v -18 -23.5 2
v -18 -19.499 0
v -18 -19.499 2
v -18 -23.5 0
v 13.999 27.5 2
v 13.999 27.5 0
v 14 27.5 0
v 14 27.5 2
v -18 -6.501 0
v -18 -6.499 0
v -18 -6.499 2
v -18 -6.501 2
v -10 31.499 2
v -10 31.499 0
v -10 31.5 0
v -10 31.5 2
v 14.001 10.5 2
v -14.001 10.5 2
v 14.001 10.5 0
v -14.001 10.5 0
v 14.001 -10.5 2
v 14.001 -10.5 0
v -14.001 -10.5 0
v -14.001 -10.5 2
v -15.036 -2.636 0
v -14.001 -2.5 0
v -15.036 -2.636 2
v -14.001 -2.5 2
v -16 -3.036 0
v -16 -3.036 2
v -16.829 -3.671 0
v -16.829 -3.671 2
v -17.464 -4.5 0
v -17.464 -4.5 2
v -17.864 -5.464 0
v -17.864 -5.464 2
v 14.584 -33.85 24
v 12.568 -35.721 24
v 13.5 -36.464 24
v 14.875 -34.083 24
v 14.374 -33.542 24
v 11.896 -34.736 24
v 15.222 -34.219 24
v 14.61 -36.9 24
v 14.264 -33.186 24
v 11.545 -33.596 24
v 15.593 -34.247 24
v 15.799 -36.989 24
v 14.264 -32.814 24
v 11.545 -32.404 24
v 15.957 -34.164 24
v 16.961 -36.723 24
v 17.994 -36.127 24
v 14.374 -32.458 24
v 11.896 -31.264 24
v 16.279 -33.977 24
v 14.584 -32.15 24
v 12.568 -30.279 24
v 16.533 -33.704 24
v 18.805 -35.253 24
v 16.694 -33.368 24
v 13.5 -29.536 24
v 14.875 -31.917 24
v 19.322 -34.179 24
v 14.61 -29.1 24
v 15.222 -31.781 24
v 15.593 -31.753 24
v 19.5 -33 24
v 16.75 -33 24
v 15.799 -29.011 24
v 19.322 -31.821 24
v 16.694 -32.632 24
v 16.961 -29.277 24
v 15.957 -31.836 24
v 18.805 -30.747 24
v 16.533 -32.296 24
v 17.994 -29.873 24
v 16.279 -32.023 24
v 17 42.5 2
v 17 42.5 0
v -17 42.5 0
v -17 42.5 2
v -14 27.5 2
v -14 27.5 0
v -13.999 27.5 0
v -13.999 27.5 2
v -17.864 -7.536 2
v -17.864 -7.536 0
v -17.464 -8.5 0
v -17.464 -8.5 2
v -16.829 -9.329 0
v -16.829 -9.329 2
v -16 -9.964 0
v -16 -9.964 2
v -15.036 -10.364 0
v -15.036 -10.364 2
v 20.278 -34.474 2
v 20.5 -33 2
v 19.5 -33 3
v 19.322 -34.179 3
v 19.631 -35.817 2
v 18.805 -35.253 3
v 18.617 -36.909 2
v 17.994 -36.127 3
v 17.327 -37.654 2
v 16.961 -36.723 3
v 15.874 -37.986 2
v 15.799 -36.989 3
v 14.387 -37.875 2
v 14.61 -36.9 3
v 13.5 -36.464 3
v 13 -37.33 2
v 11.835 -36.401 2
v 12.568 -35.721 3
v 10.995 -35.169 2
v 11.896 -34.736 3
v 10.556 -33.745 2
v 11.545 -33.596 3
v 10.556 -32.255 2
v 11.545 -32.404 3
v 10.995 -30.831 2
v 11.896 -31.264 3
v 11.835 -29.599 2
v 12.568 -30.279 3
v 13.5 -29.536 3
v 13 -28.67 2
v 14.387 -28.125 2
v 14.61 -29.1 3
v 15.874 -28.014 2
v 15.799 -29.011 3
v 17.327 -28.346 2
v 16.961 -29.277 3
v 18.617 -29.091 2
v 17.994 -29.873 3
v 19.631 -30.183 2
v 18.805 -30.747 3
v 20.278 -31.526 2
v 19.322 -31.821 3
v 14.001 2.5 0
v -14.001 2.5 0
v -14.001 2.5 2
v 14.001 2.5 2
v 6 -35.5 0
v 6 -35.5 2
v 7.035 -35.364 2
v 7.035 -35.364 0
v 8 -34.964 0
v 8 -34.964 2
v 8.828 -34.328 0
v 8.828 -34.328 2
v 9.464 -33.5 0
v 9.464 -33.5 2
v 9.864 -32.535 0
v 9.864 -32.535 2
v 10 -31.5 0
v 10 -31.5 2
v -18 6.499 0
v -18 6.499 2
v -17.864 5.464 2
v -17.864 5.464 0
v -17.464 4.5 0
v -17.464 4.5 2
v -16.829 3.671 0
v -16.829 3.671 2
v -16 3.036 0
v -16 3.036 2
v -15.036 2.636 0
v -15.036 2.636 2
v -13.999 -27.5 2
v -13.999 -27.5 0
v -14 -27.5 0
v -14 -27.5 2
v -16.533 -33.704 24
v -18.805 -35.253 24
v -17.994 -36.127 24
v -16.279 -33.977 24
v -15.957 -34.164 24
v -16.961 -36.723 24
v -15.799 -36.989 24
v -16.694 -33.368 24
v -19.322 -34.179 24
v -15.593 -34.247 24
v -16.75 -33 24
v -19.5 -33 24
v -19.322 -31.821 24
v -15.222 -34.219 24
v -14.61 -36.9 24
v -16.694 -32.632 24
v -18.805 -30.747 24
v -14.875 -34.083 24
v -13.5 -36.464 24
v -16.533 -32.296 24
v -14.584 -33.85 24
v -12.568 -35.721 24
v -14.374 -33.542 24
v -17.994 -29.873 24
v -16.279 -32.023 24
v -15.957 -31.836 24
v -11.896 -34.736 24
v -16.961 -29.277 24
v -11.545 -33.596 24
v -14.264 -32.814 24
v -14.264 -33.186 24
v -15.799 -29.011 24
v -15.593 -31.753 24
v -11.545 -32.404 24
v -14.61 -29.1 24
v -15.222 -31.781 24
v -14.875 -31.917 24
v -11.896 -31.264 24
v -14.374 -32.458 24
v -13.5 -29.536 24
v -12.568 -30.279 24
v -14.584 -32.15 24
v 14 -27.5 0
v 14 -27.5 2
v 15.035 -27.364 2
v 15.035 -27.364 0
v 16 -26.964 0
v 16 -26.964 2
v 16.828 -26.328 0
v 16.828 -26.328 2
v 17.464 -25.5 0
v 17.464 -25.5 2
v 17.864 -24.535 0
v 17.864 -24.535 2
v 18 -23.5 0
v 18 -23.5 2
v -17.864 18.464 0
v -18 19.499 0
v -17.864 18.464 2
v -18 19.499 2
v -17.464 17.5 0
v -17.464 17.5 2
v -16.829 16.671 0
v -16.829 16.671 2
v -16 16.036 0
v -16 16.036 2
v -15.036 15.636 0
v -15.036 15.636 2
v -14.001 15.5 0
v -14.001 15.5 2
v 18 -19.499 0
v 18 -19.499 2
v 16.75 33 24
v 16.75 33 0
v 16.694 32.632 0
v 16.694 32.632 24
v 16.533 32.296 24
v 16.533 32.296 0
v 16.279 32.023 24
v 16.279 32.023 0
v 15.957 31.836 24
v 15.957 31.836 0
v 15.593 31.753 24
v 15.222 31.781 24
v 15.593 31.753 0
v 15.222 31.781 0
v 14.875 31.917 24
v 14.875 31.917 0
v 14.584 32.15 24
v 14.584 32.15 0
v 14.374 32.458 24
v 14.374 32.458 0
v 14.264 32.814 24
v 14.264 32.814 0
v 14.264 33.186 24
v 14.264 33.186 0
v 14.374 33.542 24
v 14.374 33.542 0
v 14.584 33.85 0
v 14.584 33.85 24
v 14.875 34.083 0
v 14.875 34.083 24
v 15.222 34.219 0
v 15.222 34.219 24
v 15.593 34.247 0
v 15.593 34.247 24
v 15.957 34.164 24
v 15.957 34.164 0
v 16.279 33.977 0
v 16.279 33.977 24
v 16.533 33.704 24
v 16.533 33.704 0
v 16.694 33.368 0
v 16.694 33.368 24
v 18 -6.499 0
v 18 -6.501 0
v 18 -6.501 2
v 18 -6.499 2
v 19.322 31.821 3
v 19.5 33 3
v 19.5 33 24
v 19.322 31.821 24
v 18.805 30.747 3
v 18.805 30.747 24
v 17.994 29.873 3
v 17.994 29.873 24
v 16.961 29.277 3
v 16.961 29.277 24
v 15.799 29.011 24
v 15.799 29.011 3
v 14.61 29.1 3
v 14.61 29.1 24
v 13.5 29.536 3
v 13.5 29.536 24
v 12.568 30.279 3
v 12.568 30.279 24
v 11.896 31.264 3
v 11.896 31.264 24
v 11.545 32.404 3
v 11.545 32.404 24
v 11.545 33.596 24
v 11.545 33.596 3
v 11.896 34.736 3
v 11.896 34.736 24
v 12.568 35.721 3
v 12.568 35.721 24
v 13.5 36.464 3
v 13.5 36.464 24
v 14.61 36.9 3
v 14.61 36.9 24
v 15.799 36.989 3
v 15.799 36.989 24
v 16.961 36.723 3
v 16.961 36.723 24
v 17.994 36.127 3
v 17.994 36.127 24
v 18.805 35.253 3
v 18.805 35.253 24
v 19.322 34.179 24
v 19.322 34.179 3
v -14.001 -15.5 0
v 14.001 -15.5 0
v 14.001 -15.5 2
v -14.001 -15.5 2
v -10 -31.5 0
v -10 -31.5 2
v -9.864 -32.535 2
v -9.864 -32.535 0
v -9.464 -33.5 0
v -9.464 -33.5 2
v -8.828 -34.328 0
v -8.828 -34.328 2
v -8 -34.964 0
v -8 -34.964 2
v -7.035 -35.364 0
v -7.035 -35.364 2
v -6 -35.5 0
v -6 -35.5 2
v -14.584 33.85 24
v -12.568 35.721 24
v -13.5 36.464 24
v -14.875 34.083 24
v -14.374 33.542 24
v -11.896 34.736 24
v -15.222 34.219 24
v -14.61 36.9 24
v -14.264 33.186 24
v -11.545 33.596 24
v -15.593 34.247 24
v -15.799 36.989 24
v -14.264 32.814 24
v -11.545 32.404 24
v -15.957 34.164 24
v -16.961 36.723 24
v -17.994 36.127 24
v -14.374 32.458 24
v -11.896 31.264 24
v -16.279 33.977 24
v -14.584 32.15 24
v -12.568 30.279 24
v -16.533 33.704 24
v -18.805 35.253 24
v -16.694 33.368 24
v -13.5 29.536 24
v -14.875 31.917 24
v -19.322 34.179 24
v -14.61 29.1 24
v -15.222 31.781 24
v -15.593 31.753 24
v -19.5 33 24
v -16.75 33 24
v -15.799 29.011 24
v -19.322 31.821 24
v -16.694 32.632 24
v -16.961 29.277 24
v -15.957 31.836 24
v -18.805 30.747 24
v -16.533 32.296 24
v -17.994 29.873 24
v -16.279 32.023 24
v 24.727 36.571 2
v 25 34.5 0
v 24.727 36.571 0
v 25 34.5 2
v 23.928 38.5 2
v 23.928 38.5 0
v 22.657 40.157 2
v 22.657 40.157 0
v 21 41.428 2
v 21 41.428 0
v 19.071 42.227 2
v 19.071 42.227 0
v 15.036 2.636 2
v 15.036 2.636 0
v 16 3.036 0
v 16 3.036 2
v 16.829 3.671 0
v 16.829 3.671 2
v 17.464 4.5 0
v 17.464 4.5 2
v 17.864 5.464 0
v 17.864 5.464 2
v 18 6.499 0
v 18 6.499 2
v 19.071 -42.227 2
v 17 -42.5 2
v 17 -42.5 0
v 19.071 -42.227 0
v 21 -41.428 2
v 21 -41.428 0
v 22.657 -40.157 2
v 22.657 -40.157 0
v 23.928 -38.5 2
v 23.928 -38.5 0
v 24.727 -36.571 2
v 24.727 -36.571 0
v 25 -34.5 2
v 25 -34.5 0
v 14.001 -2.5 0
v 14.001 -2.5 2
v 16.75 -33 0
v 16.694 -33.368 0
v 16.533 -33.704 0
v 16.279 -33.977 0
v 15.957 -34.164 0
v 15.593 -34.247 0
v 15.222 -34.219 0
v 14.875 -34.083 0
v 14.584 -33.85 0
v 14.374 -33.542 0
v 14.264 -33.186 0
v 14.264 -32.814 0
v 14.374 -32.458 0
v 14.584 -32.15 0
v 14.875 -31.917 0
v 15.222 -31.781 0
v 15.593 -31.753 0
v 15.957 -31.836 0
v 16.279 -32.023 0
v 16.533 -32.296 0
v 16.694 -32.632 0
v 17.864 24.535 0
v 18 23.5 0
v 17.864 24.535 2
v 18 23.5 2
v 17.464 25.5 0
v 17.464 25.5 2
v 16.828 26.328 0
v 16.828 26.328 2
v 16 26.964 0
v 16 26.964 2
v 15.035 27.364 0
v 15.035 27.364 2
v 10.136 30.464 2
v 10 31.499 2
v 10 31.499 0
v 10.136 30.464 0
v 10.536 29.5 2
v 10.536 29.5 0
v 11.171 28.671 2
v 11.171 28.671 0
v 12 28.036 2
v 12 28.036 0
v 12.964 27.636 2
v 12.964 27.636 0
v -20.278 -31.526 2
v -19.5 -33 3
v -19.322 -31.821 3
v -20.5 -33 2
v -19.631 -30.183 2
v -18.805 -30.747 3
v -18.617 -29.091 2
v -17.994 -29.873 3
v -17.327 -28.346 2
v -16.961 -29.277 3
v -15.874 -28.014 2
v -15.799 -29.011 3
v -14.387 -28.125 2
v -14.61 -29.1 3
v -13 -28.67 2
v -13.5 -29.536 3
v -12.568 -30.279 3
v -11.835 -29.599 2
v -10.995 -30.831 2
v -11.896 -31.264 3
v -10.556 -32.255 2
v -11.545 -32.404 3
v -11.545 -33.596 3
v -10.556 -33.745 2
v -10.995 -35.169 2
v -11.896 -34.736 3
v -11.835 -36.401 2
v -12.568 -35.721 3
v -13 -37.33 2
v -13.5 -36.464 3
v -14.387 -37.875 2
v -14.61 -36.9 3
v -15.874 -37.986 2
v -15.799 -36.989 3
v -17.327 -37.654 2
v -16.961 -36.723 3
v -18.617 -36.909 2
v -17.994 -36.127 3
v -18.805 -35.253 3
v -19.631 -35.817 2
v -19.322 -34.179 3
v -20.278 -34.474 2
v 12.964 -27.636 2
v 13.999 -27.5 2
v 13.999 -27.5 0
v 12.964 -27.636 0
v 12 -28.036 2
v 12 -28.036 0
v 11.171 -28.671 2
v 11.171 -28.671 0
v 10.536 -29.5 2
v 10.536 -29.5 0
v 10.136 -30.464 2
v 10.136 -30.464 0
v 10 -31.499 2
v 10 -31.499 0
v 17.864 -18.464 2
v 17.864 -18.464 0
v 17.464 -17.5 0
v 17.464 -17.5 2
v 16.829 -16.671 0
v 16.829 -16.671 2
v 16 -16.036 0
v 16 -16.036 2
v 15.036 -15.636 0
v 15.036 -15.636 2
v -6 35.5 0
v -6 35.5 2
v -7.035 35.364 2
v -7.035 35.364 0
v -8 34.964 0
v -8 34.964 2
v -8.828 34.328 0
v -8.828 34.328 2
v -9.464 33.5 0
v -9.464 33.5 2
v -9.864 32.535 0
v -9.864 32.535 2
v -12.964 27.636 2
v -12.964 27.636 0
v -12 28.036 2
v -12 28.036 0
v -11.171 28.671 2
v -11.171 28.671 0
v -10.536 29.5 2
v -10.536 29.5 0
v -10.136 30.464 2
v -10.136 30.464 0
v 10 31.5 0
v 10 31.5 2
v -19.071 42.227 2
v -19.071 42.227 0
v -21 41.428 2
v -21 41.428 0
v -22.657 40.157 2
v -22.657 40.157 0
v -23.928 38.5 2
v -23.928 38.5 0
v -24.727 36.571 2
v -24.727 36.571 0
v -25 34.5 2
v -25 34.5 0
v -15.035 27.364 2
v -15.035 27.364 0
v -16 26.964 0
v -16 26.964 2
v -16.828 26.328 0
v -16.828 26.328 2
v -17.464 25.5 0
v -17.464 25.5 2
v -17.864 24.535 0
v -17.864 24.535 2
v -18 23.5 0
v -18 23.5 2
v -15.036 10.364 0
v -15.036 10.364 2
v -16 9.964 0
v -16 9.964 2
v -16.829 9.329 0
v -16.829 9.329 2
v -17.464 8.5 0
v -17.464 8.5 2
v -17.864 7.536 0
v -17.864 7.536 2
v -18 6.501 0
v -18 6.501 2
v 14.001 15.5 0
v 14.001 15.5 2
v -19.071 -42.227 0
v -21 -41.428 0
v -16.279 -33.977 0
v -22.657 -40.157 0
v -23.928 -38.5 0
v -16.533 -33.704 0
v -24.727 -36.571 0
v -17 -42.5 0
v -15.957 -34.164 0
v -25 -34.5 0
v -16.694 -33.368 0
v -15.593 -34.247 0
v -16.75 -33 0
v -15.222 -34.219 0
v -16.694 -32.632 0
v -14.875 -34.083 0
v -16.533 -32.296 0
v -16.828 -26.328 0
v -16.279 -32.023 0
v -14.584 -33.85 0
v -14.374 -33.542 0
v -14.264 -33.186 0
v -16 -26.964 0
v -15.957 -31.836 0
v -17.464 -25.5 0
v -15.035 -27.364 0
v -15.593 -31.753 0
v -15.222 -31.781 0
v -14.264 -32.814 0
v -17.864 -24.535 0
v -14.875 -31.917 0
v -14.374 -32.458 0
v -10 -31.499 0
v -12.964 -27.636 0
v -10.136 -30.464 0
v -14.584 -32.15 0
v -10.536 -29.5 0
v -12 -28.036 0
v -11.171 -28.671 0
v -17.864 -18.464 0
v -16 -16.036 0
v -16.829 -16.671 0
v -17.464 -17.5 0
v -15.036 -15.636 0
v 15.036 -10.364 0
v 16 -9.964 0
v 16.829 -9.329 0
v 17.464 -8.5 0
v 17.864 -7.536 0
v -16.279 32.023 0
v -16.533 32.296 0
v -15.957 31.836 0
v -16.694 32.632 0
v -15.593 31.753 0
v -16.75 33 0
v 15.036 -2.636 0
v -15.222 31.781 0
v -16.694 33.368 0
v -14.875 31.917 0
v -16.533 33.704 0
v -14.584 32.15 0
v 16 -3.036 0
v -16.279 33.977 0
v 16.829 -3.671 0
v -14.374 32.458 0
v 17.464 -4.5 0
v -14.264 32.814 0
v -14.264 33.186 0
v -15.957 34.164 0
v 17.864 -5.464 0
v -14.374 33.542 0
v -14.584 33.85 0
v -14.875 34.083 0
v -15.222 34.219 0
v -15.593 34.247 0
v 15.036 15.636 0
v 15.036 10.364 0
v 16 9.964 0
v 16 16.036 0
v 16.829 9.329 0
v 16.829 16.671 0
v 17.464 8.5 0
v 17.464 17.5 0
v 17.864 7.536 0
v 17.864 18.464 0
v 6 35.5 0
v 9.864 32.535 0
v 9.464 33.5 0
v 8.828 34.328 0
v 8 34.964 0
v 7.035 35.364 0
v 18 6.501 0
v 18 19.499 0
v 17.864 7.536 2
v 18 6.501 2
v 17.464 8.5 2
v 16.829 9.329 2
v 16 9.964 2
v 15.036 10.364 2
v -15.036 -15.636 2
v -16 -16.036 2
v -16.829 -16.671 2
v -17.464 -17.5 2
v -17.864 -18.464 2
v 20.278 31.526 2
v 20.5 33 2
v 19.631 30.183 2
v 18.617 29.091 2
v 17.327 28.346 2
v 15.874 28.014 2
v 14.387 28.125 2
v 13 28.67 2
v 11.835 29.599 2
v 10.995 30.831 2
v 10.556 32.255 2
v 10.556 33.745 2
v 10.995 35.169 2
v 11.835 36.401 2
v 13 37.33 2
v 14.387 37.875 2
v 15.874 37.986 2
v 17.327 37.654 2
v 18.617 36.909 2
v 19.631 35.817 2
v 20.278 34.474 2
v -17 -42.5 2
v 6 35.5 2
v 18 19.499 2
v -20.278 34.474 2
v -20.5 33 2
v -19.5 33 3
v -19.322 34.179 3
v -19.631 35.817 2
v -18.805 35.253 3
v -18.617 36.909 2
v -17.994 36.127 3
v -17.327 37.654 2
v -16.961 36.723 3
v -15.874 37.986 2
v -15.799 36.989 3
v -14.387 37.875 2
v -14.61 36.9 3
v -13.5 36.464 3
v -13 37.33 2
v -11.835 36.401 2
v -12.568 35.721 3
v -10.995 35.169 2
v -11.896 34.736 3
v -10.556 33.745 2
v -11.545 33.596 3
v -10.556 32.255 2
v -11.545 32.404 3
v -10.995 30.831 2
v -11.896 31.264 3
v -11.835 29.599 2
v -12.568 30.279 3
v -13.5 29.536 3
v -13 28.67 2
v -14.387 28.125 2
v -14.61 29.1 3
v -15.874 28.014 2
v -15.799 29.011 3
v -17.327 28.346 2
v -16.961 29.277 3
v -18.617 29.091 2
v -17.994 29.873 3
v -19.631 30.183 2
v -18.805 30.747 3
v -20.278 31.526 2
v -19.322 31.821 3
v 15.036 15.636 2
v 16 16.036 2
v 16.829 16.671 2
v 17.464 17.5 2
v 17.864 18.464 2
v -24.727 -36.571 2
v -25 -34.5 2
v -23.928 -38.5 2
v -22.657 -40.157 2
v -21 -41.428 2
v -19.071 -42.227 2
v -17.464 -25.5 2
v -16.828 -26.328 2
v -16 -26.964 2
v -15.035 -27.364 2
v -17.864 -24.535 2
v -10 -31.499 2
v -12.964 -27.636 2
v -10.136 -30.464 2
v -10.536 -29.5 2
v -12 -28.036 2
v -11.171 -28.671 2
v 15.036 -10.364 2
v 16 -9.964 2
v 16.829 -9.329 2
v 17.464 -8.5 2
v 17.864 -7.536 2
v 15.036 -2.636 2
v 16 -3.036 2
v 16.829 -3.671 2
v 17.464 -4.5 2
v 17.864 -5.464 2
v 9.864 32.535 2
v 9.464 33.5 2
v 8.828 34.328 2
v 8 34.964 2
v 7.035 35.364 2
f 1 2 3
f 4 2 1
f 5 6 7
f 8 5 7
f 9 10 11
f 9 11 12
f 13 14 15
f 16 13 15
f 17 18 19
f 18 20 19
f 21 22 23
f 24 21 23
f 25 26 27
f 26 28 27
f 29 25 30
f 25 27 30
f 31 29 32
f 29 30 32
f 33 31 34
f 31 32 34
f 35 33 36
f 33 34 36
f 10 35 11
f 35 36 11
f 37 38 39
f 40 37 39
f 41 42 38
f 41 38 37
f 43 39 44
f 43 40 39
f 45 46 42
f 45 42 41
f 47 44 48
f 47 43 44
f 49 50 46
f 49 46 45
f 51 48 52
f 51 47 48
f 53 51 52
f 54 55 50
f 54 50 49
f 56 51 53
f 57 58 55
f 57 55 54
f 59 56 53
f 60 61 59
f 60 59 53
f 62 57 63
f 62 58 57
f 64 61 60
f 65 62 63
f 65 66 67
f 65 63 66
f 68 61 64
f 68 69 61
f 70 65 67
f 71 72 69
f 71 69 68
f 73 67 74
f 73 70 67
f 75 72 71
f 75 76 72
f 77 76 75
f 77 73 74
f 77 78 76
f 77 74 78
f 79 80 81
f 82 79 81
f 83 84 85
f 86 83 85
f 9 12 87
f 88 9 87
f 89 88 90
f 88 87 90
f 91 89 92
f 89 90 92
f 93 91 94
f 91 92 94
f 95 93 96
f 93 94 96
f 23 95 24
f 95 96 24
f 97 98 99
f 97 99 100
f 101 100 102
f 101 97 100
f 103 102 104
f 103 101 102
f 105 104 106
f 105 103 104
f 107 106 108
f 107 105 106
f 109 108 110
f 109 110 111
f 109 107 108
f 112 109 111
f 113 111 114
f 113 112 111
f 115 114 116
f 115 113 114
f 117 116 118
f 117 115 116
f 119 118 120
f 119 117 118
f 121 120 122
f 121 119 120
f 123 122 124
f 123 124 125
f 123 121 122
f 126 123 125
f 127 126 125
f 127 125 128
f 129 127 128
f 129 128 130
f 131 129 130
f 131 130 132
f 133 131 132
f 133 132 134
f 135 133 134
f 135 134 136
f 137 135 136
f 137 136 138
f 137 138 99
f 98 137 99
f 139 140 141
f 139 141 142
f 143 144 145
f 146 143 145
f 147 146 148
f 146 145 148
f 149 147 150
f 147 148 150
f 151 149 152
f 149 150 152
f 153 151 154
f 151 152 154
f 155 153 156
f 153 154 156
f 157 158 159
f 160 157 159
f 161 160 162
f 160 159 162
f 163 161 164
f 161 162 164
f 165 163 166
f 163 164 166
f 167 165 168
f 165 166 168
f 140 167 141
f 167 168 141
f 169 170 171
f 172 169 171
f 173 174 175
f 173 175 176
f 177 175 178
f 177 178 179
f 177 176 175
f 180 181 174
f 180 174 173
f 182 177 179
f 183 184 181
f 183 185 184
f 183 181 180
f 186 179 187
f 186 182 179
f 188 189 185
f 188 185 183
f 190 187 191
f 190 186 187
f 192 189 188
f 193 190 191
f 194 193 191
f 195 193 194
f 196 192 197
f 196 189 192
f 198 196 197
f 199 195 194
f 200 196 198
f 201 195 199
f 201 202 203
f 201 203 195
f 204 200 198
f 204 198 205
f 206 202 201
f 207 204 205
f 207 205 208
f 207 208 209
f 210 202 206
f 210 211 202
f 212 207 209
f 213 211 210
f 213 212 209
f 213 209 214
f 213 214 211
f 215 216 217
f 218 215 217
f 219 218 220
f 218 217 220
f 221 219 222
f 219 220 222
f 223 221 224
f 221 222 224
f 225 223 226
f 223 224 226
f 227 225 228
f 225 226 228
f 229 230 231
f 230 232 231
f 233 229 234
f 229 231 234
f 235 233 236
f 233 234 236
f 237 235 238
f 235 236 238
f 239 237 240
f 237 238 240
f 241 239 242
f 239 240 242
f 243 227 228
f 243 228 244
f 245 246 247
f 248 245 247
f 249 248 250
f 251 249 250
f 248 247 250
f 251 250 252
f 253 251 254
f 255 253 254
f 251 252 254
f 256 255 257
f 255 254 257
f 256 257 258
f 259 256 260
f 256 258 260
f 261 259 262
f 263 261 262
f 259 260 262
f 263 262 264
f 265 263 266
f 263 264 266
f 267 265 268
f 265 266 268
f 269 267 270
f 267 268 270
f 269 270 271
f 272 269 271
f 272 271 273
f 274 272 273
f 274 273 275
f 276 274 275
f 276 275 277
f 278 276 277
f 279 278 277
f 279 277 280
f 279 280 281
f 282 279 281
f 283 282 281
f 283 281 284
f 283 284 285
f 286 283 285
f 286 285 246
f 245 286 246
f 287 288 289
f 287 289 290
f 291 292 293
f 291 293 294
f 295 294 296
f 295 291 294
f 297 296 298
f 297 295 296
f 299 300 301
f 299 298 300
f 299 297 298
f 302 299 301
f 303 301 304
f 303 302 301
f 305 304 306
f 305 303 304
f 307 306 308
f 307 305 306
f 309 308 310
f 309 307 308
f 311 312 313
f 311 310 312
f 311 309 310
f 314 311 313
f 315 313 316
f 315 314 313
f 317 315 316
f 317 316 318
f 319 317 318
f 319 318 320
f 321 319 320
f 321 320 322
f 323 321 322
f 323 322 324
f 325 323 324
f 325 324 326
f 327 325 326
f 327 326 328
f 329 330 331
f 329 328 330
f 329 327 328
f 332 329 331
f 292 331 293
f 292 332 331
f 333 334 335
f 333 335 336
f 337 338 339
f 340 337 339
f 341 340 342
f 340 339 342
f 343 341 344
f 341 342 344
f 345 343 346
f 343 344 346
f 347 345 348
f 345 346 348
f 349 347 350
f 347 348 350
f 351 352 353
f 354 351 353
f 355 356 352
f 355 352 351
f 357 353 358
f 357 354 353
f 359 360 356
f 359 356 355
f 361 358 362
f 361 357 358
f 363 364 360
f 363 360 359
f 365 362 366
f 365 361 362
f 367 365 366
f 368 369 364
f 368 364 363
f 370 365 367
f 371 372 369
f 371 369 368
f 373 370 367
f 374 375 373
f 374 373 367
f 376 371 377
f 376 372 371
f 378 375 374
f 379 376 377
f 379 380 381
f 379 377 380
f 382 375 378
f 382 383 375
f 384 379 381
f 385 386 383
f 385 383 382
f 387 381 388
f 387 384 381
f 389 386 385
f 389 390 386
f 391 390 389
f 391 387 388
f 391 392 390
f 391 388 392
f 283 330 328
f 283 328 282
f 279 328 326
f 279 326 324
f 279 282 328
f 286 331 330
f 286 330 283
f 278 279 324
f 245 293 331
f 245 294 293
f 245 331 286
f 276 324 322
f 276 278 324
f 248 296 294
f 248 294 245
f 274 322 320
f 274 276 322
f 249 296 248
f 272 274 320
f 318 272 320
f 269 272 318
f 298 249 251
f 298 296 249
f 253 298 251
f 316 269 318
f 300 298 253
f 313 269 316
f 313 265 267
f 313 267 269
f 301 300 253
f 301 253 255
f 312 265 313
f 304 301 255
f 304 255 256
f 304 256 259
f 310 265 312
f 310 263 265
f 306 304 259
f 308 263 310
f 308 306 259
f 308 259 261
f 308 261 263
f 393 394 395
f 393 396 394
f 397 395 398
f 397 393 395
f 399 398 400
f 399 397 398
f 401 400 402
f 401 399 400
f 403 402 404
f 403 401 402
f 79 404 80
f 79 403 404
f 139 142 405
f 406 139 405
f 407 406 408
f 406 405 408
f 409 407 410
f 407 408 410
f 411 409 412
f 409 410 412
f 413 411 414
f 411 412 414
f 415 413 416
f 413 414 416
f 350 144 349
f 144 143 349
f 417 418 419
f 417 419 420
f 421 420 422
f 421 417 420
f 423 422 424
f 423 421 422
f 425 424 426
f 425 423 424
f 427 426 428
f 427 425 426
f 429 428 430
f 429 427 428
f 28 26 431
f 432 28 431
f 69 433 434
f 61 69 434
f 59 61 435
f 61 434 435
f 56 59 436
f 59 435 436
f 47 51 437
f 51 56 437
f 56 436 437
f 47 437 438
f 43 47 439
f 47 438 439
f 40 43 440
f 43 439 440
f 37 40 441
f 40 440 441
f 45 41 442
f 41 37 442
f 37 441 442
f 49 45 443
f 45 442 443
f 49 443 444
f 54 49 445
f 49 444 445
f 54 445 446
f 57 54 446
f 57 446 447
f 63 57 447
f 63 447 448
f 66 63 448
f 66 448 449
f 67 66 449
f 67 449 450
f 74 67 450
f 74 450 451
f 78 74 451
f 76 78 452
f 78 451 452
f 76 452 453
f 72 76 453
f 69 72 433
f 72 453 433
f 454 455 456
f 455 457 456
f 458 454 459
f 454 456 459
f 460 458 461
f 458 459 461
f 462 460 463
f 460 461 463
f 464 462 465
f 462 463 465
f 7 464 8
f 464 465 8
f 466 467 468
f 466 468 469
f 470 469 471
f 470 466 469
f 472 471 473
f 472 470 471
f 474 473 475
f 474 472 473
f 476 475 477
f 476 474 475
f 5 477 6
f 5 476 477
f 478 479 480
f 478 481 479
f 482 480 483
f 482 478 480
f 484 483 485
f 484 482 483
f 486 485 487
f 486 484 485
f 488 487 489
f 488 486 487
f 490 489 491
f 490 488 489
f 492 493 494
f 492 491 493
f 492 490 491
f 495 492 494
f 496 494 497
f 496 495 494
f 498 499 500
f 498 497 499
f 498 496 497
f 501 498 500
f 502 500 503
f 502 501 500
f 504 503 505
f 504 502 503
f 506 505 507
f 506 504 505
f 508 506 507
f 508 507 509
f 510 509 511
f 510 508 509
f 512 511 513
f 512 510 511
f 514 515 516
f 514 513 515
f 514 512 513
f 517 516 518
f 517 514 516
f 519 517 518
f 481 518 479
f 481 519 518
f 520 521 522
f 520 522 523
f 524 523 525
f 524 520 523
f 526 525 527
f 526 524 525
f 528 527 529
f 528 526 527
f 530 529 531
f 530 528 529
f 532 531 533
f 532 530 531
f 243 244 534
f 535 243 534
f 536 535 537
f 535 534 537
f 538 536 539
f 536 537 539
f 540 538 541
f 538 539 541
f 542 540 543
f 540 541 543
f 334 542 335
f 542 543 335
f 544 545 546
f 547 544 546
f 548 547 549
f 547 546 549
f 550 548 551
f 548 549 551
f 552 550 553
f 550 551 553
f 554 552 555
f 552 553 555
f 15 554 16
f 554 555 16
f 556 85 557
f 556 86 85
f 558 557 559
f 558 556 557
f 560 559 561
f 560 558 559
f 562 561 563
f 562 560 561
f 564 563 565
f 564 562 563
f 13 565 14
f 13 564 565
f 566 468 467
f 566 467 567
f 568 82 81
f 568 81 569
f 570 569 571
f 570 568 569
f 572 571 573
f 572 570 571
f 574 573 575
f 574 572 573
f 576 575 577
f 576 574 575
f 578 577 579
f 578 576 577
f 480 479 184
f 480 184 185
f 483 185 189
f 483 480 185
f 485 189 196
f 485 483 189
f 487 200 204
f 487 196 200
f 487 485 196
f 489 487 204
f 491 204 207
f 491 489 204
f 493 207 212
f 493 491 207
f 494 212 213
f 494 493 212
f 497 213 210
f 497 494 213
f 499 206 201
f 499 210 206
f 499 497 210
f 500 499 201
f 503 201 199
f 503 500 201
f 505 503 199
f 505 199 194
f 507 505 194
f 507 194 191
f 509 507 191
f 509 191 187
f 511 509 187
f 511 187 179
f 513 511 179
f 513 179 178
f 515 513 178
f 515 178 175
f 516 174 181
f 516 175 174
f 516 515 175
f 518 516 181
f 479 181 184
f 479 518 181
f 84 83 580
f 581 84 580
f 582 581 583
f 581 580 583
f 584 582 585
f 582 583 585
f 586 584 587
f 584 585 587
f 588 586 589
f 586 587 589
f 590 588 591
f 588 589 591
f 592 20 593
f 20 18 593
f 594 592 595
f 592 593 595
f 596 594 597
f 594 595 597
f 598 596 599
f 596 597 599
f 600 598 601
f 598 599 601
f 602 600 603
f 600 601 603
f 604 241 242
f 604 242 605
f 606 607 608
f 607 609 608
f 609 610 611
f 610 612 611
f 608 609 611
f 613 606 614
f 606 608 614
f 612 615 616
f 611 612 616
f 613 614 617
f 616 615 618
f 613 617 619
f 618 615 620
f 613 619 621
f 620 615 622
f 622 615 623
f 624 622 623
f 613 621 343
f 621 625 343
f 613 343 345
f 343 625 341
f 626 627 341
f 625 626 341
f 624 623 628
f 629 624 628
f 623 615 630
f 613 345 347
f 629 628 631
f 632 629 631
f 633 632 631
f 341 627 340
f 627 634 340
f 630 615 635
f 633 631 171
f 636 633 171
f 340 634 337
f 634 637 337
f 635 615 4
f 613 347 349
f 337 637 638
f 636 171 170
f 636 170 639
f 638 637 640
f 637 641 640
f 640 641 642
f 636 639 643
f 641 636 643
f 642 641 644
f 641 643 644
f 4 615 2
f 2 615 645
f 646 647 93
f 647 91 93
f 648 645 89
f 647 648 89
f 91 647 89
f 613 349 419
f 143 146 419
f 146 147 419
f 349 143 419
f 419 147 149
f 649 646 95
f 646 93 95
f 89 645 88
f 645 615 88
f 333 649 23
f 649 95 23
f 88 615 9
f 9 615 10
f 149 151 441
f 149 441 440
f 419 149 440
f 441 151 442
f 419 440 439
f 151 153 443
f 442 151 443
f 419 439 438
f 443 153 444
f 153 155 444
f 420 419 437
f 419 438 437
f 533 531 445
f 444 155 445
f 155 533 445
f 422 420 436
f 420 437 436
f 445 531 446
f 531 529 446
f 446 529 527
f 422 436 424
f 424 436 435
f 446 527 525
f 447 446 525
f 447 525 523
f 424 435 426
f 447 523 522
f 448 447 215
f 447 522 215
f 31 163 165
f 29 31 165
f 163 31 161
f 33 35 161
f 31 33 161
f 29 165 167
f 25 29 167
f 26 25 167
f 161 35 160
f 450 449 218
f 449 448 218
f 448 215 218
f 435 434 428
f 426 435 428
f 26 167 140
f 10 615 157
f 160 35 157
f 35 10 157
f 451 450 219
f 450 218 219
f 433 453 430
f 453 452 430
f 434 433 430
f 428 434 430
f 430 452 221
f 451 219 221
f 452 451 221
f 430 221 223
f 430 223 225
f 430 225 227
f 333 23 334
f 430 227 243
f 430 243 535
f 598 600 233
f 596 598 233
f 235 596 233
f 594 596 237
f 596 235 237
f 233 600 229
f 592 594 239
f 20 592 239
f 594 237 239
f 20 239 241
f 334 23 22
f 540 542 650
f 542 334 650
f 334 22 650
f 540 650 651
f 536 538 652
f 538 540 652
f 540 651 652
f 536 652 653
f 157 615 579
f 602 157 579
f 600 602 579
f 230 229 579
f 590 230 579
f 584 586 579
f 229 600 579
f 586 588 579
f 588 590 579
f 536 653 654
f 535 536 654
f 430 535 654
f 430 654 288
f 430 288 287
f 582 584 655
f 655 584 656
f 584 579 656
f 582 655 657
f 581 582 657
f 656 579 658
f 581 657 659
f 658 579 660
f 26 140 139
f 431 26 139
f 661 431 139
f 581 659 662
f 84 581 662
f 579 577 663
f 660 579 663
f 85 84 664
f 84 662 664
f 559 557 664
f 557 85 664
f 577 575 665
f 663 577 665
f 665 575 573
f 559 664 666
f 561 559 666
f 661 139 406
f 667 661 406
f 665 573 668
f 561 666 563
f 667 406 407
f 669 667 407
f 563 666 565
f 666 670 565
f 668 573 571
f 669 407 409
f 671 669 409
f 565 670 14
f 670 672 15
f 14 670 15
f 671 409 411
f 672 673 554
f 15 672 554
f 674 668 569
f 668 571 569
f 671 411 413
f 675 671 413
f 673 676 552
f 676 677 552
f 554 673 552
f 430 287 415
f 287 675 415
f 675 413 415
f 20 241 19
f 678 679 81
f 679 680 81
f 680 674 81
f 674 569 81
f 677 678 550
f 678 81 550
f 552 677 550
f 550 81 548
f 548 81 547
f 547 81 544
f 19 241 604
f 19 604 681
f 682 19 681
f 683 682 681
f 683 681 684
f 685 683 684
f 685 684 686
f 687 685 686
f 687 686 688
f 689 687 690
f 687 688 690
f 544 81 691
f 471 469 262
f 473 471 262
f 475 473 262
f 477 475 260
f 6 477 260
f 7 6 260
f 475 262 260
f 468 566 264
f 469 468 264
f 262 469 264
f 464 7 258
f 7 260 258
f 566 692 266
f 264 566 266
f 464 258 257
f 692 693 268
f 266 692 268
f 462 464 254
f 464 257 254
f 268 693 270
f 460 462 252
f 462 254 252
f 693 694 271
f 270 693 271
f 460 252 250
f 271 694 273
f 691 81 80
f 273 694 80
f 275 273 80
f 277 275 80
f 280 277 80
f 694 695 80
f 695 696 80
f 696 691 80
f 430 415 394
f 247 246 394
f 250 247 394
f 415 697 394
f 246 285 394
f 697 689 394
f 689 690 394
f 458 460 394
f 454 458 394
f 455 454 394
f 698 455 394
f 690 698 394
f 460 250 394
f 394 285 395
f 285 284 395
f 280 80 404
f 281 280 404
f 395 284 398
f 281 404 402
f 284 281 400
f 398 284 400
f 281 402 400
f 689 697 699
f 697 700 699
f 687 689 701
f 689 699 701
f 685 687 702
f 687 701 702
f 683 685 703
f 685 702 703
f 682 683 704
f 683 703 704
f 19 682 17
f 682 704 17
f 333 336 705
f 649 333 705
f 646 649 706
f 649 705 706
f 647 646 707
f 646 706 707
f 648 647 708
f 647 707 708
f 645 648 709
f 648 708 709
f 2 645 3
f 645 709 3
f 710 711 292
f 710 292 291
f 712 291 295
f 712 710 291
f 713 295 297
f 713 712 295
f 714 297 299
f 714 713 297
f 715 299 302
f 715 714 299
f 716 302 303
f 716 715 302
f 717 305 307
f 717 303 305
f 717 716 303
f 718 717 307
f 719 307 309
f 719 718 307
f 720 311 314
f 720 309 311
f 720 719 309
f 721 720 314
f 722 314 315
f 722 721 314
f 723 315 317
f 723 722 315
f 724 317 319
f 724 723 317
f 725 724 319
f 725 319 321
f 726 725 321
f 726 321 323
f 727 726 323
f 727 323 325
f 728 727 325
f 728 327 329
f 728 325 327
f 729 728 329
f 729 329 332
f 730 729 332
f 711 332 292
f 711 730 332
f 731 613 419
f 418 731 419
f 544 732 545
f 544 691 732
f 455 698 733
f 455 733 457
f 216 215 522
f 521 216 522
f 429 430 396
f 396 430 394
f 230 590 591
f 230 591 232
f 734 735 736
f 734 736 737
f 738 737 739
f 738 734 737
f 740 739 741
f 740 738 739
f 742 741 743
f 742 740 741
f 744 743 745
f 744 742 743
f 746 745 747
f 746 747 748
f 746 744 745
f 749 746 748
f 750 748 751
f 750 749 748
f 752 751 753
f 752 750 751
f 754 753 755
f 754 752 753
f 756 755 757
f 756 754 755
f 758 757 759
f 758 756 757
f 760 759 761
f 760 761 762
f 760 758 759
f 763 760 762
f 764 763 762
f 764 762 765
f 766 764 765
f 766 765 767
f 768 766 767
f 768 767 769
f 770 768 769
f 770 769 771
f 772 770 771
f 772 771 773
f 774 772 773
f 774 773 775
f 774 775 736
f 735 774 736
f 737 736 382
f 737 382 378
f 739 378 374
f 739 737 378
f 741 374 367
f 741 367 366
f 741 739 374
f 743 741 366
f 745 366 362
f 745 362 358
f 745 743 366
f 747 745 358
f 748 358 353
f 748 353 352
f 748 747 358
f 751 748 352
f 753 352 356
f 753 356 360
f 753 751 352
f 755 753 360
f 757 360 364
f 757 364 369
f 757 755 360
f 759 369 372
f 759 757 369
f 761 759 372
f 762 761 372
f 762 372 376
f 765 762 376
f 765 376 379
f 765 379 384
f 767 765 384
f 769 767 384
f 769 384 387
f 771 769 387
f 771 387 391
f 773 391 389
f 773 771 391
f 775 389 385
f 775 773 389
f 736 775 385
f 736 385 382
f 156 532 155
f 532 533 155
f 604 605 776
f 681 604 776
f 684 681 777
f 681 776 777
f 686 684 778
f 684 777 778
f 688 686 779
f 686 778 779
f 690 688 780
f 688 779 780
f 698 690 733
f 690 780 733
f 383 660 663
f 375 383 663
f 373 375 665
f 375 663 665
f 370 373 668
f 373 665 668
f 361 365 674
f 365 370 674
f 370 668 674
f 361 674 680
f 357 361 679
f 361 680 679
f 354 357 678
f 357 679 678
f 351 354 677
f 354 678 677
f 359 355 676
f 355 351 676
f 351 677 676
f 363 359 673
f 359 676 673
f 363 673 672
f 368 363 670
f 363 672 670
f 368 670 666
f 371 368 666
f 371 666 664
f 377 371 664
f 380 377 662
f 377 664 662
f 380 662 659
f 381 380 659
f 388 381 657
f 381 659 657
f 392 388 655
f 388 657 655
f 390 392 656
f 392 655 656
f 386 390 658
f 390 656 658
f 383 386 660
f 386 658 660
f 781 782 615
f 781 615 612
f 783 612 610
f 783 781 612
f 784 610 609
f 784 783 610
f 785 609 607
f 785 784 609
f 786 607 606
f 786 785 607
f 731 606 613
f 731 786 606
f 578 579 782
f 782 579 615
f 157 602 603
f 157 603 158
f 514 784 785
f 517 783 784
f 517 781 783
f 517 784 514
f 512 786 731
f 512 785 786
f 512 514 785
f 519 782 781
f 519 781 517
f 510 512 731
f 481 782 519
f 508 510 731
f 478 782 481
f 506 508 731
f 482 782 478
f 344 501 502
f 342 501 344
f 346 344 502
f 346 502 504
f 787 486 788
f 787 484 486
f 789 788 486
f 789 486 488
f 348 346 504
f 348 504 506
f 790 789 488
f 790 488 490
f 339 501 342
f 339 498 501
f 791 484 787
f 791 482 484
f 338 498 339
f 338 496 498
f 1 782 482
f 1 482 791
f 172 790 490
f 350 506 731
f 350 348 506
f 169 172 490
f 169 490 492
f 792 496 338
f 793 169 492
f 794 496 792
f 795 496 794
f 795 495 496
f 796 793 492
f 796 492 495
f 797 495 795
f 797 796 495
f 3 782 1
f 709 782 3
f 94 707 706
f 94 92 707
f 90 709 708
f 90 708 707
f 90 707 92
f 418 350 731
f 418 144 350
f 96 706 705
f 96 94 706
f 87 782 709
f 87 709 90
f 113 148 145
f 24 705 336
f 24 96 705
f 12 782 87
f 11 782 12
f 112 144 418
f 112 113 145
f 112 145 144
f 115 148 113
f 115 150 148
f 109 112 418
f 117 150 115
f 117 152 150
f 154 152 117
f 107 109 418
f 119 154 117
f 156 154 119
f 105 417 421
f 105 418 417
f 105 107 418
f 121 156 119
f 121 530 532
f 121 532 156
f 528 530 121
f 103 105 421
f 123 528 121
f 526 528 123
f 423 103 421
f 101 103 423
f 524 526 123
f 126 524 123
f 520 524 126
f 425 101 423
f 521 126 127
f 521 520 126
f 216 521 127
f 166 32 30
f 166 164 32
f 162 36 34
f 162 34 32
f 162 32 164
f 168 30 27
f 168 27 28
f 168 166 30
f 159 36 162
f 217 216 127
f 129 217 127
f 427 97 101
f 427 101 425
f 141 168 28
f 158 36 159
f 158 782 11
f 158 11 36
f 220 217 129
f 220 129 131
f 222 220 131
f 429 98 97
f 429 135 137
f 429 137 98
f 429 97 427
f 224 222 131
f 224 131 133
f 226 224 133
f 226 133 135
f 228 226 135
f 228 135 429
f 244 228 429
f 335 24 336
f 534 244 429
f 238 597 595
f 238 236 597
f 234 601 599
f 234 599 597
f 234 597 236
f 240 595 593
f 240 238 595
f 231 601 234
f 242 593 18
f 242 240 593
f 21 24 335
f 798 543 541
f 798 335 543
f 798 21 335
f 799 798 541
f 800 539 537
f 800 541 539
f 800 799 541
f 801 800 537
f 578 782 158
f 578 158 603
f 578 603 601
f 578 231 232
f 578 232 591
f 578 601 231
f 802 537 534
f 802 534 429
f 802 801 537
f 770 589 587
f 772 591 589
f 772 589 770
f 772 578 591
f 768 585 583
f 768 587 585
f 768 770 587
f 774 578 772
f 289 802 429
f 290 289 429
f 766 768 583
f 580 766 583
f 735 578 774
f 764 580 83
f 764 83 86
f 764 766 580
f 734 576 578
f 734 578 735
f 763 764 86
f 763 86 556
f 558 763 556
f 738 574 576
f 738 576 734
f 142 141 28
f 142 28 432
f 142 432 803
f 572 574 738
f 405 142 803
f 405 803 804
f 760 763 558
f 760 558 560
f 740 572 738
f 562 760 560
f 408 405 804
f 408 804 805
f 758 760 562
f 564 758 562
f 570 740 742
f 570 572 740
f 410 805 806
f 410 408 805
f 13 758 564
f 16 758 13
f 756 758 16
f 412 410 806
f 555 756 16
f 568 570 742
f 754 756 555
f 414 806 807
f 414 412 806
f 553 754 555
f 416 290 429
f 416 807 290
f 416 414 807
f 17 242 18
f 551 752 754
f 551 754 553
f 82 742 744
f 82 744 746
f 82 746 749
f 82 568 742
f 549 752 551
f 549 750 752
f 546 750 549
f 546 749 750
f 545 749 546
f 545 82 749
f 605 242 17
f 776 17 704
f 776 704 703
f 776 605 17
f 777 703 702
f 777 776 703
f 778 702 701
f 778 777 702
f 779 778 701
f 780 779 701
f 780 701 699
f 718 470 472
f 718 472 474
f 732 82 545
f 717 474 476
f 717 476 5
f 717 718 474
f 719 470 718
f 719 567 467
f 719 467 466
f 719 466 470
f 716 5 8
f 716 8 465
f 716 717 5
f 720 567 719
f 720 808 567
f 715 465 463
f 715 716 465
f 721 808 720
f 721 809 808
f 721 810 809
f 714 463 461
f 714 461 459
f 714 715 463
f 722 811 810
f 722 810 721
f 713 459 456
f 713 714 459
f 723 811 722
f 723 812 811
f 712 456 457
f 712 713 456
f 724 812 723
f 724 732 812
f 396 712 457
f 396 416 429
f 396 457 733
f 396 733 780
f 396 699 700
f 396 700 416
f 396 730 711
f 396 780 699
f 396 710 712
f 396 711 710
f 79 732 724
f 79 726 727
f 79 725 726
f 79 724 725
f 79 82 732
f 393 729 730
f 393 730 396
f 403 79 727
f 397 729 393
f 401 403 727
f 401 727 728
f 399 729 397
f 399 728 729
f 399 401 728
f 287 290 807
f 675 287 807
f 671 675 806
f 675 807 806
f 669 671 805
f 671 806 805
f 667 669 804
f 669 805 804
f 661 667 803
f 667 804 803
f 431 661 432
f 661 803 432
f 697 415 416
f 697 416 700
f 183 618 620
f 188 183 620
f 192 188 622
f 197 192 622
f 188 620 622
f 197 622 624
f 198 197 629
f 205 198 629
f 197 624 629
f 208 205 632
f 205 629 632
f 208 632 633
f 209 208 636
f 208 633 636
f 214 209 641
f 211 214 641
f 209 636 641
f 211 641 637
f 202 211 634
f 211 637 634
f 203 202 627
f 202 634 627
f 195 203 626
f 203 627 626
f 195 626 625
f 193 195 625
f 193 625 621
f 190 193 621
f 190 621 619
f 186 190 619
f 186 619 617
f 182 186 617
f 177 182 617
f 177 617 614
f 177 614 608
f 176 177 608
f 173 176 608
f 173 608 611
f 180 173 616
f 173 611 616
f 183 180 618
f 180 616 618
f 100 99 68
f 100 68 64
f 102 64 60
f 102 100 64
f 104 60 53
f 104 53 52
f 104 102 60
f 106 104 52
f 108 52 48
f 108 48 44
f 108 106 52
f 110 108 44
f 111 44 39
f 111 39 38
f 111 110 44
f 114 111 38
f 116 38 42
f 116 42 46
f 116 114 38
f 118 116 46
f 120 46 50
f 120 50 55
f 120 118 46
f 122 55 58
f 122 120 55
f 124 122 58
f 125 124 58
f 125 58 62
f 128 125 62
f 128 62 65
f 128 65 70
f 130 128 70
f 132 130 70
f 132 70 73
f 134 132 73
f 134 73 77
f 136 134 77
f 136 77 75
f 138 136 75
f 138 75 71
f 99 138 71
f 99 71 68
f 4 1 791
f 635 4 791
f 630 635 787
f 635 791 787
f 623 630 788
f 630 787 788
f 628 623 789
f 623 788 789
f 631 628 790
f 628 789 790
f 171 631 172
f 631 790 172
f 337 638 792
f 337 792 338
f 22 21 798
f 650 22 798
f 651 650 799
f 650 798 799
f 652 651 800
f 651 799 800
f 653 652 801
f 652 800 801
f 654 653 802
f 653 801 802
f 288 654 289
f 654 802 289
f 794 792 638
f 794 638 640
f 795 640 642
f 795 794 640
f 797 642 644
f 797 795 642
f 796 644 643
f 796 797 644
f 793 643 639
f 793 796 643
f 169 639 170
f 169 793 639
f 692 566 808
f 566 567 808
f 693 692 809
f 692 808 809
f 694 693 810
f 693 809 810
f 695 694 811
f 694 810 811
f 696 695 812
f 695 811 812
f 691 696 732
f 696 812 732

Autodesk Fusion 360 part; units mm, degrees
sketch "Sketch1" plane through (0, 0, 0) normal (0, 0, 1) x (1, 0, 0)
  line L0 (25, 42.5) -> (-25, 42.5)
  line L1 (-25, 42.5) -> (-25, -42.5)
  line L2 (-25, -42.5) -> (25, -42.5)
  line L3 (25, -42.5) -> (25, 42.5)
  line L4 (25, 42.5) -> (-25, -42.5) construction
  line L5 (-25, 42.5) -> (25, -42.5) construction
  line L6 (25, 42.5) -> (46.6506, 55)
  line L7 (25, 42.5) -> (55, 42.5) construction
  line L8 (0, 42.5) -> (0, -42.5)
  line L9 (-25, 0) -> (25, 0)
  line L10 (25, 42.5) -> (23.5, 45.0981)
  line L11 (23.5, 45.0981) -> (45.1506, 57.5981)
  line L12 (45.1506, 57.5981) -> (46.6506, 55)
  line L13 (25, 42.5) -> (26.5, 39.9019)
  line L14 (26.5, 39.9019) -> (48.1506, 52.4019)
  line L15 (23.5, 45.0981) -> (19, 42.5)
  line L16 (26.5, 39.9019) -> (25, 39.0359)
  line L17 (48.1506, 52.4019) -> (46.6506, 55)
  circle A0 centre (46.6506, 55) radius 8.75
  circle A1 centre (46.6506, 55) radius 7.75
  line L18 (46.6506, 55) -> (42.7756, 61.7117)
  line L19 (46.6506, 55) -> (53.3623, 58.875)
  line L20 (46.6506, 55) -> (50.5256, 48.2883)
  circle A2 centre (46.6506, 55) radius 1.5
  line L21 (46.6506, 55) -> (50.9808, 57.5)
  circle A3 centre (50.9808, 57.5) radius 1.1
  circle A4 centre (42.3205, 52.5) radius 1.1
  line L22 (46.6506, 55) -> (44.1506, 59.3301)
  circle A5 centre (44.1506, 59.3301) radius 1.1
  circle A6 centre (49.1506, 50.6699) radius 1.1
  circle A7 centre (-49.1506, 50.6699) radius 1.1
  circle A8 centre (-50.9808, 57.5) radius 1.1
  circle A9 centre (-44.1506, 59.3301) radius 1.1
  circle A10 centre (-46.6506, 55) radius 1.5
  circle A11 centre (-42.3205, 52.5) radius 1.1
  line L23 (-23.5, 45.0981) -> (-45.1506, 57.5981)
  line L24 (-26.5, 39.9019) -> (-48.1506, 52.4019)
  circle A12 centre (-46.6506, 55) radius 8.75
  circle A13 centre (-46.6506, 55) radius 7.75
  line L25 (-26.5, 39.9019) -> (-25, 39.0359)
  line L26 (-23.5, 45.0981) -> (-19, 42.5)
  circle A14 centre (-46.6506, -55) radius 7.75
  circle A15 centre (-44.1506, -59.3301) radius 1.1
  circle A16 centre (-46.6506, -55) radius 1.5
  circle A17 centre (-49.1506, -50.6699) radius 1.1
  circle A18 centre (-42.3205, -52.5) radius 1.1
  circle A19 centre (-50.9808, -57.5) radius 1.1
  line L27 (-26.5, -39.9019) -> (-48.1506, -52.4019)
  line L28 (-23.5, -45.0981) -> (-45.1506, -57.5981)
  line L29 (-23.5, -45.0981) -> (-19, -42.5)
  line L30 (-26.5, -39.9019) -> (-25, -39.0359)
  line L31 (23.5, -45.0981) -> (19, -42.5)
  line L32 (26.5, -39.9019) -> (25, -39.0359)
  line L33 (26.5, -39.9019) -> (48.1506, -52.4019)
  line L34 (23.5, -45.0981) -> (45.1506, -57.5981)
  circle A20 centre (46.6506, -55) radius 8.75
  circle A21 centre (46.6506, -55) radius 7.75
  circle A22 centre (49.1506, -50.6699) radius 1.1
  circle A23 centre (46.6506, -55) radius 1.5
  circle A24 centre (42.3205, -52.5) radius 1.1
  circle A25 centre (44.1506, -59.3301) radius 1.1
  circle A26 centre (50.9808, -57.5) radius 1.1
  circle A27 centre (-46.6506, -55) radius 7.75
  circle A28 centre (-46.6506, -55) radius 8.75
  line L35 (25, 0) -> (25, -42.5)
  line L36 (0, 0) -> (0, -9)
  line L37 (0, -9) -> (0, -10.6)
  line L38 (0, -9) -> (0, -7.4)
  line L39 (0, -9) -> (1, -9)
  line L40 (19, -42.5) -> (25.9282, -46.5)
  line L41 (25, -39.0359) -> (25.0866, -34.0366)
  line L42 (19, -42.5) -> (16, -42.5)
  line L43 (19, -42.5) -> (14.6699, -40)
  line L44 (14.6699, -40) -> (34.8771, -40) construction
  line L45 (25, -39.0359) -> (17.5453, -34.8631)
  line L46 (14.6699, -40) -> (17.5453, -34.8631)
  line L47 (17.5453, -34.8631) -> (25, -21.5453)
  line L48 (25, -42.5) -> (25, -33)
  line L49 (25, -33) -> (15.5, -33)
  circle A29 centre (15.5, -33) radius 2.3
  circle A30 centre (15.5, -33) radius 4
  line L50 (-25, -42.5) -> (-18, -42.5)
  line L51 (-18, -42.5) -> (-18, -27.5)
  line L52 (-18, 42.5) -> (-18, 27.5)
  line L53 (-25, 42.5) -> (-18, 42.5)
  line L54 (18, 42.5) -> (18, 27.5)
  line L55 (18, -42.5) -> (18, -27.5)
  line L56 (18, -30) -> (18, 27.5)
  line L57 (18, 27.5) -> (-18, 27.5)
  line L58 (-18, 27.5) -> (-18, -27.5)
  line L59 (18, -27.5) -> (-18, -27.5)
  circle A31 centre (15.5, -33) radius 1.25
  circle A32 centre (-15.5, -33) radius 1.25
  circle A33 centre (-15.5, -33) radius 2.3
  circle A34 centre (-15.5, -33) radius 4
  circle A35 centre (-15.5, 33) radius 4
  circle A36 centre (-15.5, 33) radius 2.3
  circle A37 centre (-15.5, 33) radius 1.25
  circle A38 centre (15.5, 33) radius 1.25
  circle A39 centre (15.5, 33) radius 2.3
  circle A40 centre (15.5, 33) radius 4
  line L60 (18, 27.5) -> (18, 15.5)
  line L61 (18, 15.5) -> (-18, 15.5)
  line L62 (18, 15.5) -> (18, 10.5)
  line L63 (18, 10.5) -> (-18, 10.5)
  line L64 (18, -10.5) -> (-18, -10.5)
  line L65 (18, -15.5) -> (-18, -15.5)
  line L66 (0, 0) -> (0, 2.5)
  line L67 (0, 2.5) -> (-18, 2.5)
  line L68 (0, 2.5) -> (18, 2.5)
  line L69 (0, -2.5) -> (18, -2.5)
  line L70 (0, -2.5) -> (-18, -2.5)
  line L71 (0, 27.5) -> (10, 27.5)
  line L72 (10, 27.5) -> (10, 42.5)
  line L73 (-10, 27.5) -> (-10, 42.5)
  line L74 (10, 42.5) -> (10, 35.5)
  line L75 (10, 35.5) -> (-10, 35.5)
  line L76 (10, -35.5) -> (-10, -35.5)
  line L77 (-10, -27.5) -> (-10, -42.5)
  line L78 (10, -27.5) -> (10, -42.5)
  point P0 (-46.6506, -55)
  dimension "d1" = 50
  dimension "d2" = 85
  dimension "d4" = 25
  dimension "d5" = 30
  dimension "d6" = 3
  dimension "d7" = 25
  dimension "d8" = 17.5
  dimension "d9" = 15.5
  dimension "d10" = 3
  dimension "d11" = 5
  dimension "d12" = 2.2
  dimension "d13" = 5
  dimension "d14" = 2.2
  dimension "d23" = 9
  dimension "d24" = 1.6
  dimension "d25" = 1.6
  dimension "d51" = 8
  dimension "d76" = 5
  dimension "d77" = 3
  dimension "d88" = 5
  dimension "d130" = 180
  dimension "d131" = 9.5
  dimension "d132" = 9.5
  dimension "d133" = 4.6
  dimension "d134" = 8
  dimension "d141" = 7
  dimension "d142" = 15
  dimension "d170" = 2.5
  dimension "d180" = 12
  dimension "d181" = 5
  dimension "d182" = 2.5
  dimension "d186" = 10
  dimension "d187" = 7
extrude "Extrude1" add sketch "Sketch1" along normal blind 2 contours L3 L9 L35 L47 A30 L55 L56 | L3 L35 L47 L49 A30 | L8 L9 L36 L56 L69 | L8 L9 L56 L66 L68 | L3 L35 L45 L48 L49 A30 | L47 L49 A30 | L47 L49 A30 L55 L56 | L8 L36 L37 L38 L56 L64 L69 | L2 L3 L35 L43 L45 L48 A30 L55 | L45 L47 L49 A30 L55 | L47 L49 L55 | L46 L47 A30 L55 L56 | L2 L42 L43 L46 A30 L55 L56 L59 L78 | L8 L37 L56 L64 L65 | L45 A30 L55 | L45 L47 L55 | L43 L46 A30 L55 | L45 L46 A30 L55 | L8 L56 L59 L65 | L2 L42 L43 L55 | L8 L59 L76 L78 | L2 L8 L76 L78
extrude "Extrude3" add sketch "Sketch1" along normal blind 24 contours L47 L49 A30 | L47 L49 A30 L55 L56 | L45 L47 L49 A30 L55 | L47 L49 L55 | A29 | L46 L47 A30 L55 L56 | L45 A30 L55 | L45 L47 L55 | L45 L46 A30 L55
mirror "Mirror3" about plane through (0, -27.5, 0) normal (-1, 0, 0) of bodies 1 merged
extrude "Extrude6" cut sketch "Sketch1" along normal blind 12 contours L8 L36 L37 L38 L56 L64 L69 | L8 L56 L63 L68 | L8 L56 L57 L60 L61 L71 | L8 L58 L63 L67 | L8 L36 L37 L38 L58 L64 L70 | L8 L56 L61 L62 L63 | L8 L57 L58 L61 | L8 L56 L59 L65 | L8 L58 L61 L63 | L8 L58 L59 L65
fillet "Fillet4" radius 8 2 edges at (25, -42.5, 1) (-25, -42.5, 1)
mirror "Mirror5" about plane through (18, 0, 0) normal (0, 1, 0) of bodies 1 merged
fillet "Fillet8" radius 4 4 edges at (18, 27.5, 1) (-18, 27.5, 1) (18, -27.5, 1) (-18, -27.5, 1)
fillet "Fillet9" radius 4 12 edges at (-18, -15.5, 1) (-18, -10.5, 1) (-18, -2.5, 1) (-18, 2.5, 1) (18, 2.5, 1) (18, -2.5, 1) (18, -10.5, 1) (18, -15.5, 1) (18, 10.5, 1) (-18, 10.5, 1) (-18, 15.5, 1) (18, 15.5, 1)
chamfer "Chamfer46" distance 1 angle 45 4 edges at (11.7707, 31.5535, 2) (-11.7707, 31.5535, 2) (11.7707, -31.5535, 2) (-11.7707, -31.5535, 2)
extrude "Extrude9" cut sketch "Sketch1" along normal blind 7 contours L8 L57 L71 L72 L75 | L8 L57 L73 L75 | L8 L59 L76 L78 | L8 L59 L76 L77
fillet "Fillet10" radius 4 4 edges at (-10, -35.5, 1) (10, -35.5, 1) (10, 35.5, 1) (-10, 35.5, 1)
fillet "Fillet11" radius 4 4 edges at (-10, 27.5, 1) (10, 27.5, 1) (-10, -27.5, 1) (10, -27.5, 1)
